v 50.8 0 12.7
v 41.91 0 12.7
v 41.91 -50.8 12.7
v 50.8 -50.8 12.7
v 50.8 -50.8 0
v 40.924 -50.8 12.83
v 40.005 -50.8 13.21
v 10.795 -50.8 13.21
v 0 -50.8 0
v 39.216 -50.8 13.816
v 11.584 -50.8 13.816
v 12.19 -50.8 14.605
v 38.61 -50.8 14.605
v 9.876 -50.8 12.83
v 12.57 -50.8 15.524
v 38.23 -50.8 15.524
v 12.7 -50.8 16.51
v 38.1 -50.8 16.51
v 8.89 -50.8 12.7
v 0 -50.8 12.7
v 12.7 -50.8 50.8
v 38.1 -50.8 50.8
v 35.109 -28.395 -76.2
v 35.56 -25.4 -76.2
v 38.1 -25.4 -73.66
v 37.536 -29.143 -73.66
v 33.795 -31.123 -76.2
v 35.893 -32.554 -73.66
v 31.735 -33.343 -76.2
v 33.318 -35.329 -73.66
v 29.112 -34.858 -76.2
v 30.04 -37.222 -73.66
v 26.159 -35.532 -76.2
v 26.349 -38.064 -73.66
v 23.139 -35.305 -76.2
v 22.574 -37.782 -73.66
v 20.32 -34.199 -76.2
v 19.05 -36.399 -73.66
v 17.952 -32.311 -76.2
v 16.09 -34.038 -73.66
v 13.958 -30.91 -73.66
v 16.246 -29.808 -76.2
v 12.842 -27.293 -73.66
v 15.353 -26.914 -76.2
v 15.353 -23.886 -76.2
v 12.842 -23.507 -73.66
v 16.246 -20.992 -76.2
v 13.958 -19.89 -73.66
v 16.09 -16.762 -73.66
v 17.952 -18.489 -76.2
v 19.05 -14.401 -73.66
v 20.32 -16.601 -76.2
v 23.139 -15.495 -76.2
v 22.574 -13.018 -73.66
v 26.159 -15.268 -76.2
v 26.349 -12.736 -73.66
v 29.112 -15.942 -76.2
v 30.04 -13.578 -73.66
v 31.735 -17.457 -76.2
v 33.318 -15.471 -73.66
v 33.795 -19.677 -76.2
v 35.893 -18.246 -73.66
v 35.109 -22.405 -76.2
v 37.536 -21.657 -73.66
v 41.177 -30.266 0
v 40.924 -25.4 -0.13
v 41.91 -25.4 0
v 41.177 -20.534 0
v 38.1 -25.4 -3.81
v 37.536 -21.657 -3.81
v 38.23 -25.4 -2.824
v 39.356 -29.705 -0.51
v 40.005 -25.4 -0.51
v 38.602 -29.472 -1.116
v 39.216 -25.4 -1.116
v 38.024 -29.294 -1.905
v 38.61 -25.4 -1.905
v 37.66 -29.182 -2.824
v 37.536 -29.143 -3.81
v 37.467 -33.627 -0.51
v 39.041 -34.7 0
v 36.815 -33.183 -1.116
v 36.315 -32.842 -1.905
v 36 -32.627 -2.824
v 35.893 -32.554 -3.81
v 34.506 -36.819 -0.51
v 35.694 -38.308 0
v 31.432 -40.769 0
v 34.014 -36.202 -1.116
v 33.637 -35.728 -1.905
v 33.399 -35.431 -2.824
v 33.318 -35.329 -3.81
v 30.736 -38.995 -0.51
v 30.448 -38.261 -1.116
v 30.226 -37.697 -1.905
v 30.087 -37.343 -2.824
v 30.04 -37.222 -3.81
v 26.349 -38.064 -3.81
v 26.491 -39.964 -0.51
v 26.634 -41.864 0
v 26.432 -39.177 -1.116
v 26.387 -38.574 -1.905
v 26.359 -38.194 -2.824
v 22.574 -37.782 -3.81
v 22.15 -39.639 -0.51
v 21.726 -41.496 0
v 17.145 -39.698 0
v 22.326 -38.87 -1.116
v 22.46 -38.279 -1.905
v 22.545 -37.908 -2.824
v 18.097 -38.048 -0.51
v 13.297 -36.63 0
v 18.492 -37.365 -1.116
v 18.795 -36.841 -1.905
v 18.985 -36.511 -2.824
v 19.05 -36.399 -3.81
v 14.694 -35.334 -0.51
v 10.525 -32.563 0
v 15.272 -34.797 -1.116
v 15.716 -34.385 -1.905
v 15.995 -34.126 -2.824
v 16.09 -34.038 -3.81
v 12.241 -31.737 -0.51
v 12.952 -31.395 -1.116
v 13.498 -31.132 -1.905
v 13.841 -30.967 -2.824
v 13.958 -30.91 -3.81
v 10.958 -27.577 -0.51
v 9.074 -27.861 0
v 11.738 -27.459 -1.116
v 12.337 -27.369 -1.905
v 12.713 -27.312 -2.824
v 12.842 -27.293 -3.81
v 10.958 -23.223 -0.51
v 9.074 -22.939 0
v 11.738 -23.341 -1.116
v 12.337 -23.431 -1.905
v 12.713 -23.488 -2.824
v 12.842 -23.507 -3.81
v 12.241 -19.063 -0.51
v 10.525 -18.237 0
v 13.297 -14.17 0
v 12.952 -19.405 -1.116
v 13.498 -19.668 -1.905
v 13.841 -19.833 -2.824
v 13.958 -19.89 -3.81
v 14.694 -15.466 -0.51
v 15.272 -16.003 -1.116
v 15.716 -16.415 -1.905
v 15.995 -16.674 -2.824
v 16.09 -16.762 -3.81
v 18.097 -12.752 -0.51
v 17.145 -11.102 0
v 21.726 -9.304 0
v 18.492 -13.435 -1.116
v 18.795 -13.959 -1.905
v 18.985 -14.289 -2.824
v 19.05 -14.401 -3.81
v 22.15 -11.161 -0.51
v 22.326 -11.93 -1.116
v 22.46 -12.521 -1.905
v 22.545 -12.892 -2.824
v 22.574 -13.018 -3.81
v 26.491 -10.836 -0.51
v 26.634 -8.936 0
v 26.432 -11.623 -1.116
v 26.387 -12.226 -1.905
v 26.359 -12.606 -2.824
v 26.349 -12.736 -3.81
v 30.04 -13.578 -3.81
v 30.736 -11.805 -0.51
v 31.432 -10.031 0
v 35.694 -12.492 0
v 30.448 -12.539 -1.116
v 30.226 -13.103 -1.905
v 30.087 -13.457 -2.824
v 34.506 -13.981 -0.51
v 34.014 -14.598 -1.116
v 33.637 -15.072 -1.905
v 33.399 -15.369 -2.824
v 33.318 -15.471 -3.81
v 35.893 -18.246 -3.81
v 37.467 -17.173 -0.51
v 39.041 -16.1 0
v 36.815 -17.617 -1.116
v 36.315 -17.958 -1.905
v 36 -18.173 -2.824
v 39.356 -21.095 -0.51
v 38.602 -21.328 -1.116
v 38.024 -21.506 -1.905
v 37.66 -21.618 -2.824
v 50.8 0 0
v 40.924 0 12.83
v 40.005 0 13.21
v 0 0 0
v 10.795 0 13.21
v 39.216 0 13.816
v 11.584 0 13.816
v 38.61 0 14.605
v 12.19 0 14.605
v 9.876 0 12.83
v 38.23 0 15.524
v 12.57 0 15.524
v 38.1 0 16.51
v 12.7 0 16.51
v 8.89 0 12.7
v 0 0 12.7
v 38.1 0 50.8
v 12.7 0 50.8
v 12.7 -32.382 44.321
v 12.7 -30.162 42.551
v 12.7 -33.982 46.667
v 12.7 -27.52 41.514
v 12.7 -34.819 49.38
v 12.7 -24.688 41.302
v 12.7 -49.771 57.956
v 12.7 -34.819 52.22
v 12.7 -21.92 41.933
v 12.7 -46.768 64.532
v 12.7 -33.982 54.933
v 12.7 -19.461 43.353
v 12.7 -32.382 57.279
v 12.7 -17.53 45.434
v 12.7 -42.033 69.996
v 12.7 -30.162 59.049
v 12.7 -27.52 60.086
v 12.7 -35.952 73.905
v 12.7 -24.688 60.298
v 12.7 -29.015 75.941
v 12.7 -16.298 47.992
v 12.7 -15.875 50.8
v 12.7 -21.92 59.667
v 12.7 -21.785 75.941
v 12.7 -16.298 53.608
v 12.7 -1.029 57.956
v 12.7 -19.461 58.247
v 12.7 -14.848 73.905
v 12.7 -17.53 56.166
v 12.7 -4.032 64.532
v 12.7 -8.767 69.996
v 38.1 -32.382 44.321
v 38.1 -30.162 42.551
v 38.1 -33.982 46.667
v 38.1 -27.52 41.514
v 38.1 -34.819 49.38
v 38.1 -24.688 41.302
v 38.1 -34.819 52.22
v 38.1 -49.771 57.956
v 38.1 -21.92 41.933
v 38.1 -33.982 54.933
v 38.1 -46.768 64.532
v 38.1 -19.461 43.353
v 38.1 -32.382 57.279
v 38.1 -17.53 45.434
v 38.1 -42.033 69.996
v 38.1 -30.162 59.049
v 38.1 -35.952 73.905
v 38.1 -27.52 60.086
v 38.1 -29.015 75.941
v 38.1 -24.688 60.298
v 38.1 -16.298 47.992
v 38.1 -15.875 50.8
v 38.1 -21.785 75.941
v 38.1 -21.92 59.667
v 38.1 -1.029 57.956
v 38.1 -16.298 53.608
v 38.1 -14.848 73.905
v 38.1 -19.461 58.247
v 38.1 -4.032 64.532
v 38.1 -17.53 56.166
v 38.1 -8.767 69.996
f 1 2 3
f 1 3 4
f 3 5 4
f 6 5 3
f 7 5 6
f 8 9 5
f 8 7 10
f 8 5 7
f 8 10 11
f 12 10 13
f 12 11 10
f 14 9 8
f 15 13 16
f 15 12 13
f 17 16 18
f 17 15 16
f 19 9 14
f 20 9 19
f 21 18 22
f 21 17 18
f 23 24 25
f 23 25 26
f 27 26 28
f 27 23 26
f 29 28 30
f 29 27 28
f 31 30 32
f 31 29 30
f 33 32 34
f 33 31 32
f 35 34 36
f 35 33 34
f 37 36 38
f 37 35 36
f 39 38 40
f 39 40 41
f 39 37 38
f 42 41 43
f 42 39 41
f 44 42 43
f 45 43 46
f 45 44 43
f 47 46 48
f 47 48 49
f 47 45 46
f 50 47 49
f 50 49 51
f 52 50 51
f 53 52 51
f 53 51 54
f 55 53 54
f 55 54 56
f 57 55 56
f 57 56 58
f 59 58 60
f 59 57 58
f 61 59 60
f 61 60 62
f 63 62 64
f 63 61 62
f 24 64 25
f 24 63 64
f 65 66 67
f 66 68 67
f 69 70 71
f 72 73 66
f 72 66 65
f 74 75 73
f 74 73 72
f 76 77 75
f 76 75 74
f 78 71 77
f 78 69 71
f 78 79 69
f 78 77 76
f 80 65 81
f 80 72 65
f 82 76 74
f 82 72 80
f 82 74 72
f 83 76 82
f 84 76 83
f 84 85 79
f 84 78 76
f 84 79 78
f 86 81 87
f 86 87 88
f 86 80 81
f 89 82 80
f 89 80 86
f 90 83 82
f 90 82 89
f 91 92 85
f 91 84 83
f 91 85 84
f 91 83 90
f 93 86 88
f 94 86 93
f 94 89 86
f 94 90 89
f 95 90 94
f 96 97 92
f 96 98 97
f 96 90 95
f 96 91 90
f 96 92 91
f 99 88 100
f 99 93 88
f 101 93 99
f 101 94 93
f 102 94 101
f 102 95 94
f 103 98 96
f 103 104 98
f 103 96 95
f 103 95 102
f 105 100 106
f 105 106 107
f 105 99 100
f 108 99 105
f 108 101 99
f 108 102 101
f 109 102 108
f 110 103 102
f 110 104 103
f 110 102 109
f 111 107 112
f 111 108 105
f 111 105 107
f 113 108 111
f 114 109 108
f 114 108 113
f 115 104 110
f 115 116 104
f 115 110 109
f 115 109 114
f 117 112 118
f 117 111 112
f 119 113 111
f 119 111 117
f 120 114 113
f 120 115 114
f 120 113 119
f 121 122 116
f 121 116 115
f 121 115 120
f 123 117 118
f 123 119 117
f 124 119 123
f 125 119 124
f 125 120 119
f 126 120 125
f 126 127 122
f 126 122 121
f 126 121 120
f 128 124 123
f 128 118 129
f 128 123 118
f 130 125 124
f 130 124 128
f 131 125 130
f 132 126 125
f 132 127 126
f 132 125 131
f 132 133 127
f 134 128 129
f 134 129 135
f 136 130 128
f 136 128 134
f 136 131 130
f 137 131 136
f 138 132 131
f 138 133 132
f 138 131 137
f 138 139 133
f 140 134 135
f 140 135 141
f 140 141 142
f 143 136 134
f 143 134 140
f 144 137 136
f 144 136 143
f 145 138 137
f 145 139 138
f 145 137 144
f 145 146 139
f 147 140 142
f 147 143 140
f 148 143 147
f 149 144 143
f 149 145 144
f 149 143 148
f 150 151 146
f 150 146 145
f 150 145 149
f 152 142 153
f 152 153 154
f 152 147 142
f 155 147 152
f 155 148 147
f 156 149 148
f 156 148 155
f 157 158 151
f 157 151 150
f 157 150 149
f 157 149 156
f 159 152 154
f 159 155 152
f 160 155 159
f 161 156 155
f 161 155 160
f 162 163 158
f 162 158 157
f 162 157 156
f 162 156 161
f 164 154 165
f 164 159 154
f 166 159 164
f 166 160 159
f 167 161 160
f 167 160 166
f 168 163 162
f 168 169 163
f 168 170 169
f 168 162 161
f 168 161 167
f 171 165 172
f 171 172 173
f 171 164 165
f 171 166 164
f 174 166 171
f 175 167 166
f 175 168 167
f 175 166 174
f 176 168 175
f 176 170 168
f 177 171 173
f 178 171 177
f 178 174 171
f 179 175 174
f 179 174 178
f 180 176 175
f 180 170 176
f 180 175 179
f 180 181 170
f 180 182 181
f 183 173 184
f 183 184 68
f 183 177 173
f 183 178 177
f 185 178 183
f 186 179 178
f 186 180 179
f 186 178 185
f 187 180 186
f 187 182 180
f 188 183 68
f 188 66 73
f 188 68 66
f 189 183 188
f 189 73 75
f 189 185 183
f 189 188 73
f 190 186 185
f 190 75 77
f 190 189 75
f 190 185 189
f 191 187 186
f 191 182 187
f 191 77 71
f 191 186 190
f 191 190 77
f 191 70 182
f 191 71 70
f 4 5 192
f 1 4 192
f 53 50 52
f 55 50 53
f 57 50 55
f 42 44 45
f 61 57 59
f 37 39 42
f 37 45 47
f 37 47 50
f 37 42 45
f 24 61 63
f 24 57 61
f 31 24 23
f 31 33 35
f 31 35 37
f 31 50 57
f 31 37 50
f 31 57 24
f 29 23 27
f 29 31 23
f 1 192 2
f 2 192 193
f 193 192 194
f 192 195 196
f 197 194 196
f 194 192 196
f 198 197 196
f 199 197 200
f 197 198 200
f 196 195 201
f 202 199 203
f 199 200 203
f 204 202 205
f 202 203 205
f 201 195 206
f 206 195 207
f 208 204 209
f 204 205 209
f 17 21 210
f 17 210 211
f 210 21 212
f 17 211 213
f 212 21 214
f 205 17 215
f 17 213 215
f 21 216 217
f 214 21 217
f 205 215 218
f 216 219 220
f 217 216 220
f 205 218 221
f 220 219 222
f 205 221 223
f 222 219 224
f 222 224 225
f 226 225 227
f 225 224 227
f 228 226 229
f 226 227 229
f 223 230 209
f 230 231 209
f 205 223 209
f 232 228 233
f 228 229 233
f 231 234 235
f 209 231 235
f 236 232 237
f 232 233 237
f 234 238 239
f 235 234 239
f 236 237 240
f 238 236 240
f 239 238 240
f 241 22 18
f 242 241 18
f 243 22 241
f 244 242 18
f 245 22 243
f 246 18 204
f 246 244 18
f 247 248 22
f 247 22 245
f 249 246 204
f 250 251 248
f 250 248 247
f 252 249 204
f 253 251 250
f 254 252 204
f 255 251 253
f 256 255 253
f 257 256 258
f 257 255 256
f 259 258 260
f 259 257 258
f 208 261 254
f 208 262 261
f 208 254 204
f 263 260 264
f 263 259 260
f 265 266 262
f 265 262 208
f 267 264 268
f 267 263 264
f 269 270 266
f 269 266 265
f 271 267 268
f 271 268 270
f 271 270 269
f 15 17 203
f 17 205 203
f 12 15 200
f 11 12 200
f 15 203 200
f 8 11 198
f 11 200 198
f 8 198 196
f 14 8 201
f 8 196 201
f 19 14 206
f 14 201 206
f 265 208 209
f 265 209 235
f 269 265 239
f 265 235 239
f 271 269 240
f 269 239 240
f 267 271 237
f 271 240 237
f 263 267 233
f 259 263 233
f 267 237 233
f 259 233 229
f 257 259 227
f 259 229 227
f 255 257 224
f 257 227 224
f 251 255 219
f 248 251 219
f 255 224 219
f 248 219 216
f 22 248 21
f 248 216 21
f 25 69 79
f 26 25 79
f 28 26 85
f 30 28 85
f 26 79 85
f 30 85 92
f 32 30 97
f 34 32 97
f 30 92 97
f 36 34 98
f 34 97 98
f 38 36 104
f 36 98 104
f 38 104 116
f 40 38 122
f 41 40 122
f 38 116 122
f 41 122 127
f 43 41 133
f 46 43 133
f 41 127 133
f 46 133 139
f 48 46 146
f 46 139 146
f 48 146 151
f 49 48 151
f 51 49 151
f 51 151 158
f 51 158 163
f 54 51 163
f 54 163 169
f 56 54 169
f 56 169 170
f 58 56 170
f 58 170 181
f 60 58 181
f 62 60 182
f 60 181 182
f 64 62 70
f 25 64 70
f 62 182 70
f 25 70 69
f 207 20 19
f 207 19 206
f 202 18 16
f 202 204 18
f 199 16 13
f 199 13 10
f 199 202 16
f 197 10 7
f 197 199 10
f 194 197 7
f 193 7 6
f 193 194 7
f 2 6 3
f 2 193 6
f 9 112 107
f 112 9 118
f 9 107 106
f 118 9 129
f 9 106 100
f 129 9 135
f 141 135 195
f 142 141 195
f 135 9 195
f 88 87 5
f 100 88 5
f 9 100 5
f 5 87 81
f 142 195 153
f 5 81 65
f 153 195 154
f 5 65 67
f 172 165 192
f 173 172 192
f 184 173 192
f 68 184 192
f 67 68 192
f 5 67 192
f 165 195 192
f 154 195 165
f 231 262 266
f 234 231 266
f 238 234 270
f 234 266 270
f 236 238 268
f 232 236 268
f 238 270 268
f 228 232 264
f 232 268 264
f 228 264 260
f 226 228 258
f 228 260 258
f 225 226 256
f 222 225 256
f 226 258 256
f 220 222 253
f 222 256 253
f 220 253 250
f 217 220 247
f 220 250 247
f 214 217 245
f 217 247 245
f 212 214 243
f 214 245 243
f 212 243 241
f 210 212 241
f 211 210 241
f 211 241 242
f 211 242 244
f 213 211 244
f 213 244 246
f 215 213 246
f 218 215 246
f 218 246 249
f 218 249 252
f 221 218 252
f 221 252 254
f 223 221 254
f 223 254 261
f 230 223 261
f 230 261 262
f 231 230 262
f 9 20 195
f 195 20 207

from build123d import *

# Parameters (mm, degrees)
F0_W      = 50.8
F0_H      = 50.8
F1_DEPTH  = 12.7
F3_R      = 12.7
F4_DEPTH  = 76.2
F5_W      = 50.8
F5_H      = 38.1
F6_DEPTH  = 38.1
F7_DEPTH  = 12.7
F8_R      = 9.525
F9_DEPTH  = 38.101
F10_R     = 3.81
F11_SIZE2 = 2.54
F11_SIZE  = 2.54


with BuildPart() as f1:
    # F0 (on Top) → F1 (new body)
    with BuildSketch(Plane.XY):
        with Locations((25.4, -25.4)):
            Rectangle(F0_W, F0_H)
    extrude(amount=F1_DEPTH)

    # F3 (on face) → F4 (join)
    with BuildSketch(Plane(origin=(0, 0, 0), x_dir=(1, 0, 0), z_dir=(0, 0, -1))):
        with Locations((25.4, 25.4)):
            Circle(F3_R)
    extrude(amount=F4_DEPTH)

    # F5 (on Right) → F6 (join)
    with BuildSketch(Plane.YZ):
        with BuildLine():
            ThreePointArc((0, 50.8), (-25.4, 76.2), (-50.8, 50.8))
            Line((-50.8, 50.8), (0, 50.8))
        make_face()
        with Locations((-25.4, 31.75)):
            Rectangle(F5_W, F5_H)
    extrude(amount=F6_DEPTH)

    # F5 (on Right) → F7 (cut)
    with BuildSketch(Plane.YZ):
        with BuildLine():
            ThreePointArc((0, 50.8), (-25.4, 76.2), (-50.8, 50.8))
            Line((-50.8, 50.8), (0, 50.8))
        make_face()
        with Locations((-25.4, 31.75)):
            Rectangle(F5_W, F5_H)
    extrude(amount=F7_DEPTH, mode=Mode.SUBTRACT)

    # F8 (on face) → F9 (cut, through all)
    with BuildSketch(Plane.YZ.offset(38.1)):
        with Locations((-25.4, 50.8)):
            Circle(F8_R)
    extrude(amount=-F9_DEPTH, mode=Mode.SUBTRACT)

    # F10
    f10_edges = [f1.edges().sort_by_distance(p)[0] for p in [
        (38.1, -25.4, 12.7),
        (12.7, -25.4, 12.7),
        (12.7, -25.4, 0),
    ]]
    fillet(f10_edges, radius=F10_R)

    # F11
    f11_edges = [f1.edges().sort_by_distance(p)[0] for p in [
        (12.7, -25.4, -76.2),
    ]]
    chamfer(f11_edges, length=F11_SIZE, length2=F11_SIZE2)


solid = f1.part
